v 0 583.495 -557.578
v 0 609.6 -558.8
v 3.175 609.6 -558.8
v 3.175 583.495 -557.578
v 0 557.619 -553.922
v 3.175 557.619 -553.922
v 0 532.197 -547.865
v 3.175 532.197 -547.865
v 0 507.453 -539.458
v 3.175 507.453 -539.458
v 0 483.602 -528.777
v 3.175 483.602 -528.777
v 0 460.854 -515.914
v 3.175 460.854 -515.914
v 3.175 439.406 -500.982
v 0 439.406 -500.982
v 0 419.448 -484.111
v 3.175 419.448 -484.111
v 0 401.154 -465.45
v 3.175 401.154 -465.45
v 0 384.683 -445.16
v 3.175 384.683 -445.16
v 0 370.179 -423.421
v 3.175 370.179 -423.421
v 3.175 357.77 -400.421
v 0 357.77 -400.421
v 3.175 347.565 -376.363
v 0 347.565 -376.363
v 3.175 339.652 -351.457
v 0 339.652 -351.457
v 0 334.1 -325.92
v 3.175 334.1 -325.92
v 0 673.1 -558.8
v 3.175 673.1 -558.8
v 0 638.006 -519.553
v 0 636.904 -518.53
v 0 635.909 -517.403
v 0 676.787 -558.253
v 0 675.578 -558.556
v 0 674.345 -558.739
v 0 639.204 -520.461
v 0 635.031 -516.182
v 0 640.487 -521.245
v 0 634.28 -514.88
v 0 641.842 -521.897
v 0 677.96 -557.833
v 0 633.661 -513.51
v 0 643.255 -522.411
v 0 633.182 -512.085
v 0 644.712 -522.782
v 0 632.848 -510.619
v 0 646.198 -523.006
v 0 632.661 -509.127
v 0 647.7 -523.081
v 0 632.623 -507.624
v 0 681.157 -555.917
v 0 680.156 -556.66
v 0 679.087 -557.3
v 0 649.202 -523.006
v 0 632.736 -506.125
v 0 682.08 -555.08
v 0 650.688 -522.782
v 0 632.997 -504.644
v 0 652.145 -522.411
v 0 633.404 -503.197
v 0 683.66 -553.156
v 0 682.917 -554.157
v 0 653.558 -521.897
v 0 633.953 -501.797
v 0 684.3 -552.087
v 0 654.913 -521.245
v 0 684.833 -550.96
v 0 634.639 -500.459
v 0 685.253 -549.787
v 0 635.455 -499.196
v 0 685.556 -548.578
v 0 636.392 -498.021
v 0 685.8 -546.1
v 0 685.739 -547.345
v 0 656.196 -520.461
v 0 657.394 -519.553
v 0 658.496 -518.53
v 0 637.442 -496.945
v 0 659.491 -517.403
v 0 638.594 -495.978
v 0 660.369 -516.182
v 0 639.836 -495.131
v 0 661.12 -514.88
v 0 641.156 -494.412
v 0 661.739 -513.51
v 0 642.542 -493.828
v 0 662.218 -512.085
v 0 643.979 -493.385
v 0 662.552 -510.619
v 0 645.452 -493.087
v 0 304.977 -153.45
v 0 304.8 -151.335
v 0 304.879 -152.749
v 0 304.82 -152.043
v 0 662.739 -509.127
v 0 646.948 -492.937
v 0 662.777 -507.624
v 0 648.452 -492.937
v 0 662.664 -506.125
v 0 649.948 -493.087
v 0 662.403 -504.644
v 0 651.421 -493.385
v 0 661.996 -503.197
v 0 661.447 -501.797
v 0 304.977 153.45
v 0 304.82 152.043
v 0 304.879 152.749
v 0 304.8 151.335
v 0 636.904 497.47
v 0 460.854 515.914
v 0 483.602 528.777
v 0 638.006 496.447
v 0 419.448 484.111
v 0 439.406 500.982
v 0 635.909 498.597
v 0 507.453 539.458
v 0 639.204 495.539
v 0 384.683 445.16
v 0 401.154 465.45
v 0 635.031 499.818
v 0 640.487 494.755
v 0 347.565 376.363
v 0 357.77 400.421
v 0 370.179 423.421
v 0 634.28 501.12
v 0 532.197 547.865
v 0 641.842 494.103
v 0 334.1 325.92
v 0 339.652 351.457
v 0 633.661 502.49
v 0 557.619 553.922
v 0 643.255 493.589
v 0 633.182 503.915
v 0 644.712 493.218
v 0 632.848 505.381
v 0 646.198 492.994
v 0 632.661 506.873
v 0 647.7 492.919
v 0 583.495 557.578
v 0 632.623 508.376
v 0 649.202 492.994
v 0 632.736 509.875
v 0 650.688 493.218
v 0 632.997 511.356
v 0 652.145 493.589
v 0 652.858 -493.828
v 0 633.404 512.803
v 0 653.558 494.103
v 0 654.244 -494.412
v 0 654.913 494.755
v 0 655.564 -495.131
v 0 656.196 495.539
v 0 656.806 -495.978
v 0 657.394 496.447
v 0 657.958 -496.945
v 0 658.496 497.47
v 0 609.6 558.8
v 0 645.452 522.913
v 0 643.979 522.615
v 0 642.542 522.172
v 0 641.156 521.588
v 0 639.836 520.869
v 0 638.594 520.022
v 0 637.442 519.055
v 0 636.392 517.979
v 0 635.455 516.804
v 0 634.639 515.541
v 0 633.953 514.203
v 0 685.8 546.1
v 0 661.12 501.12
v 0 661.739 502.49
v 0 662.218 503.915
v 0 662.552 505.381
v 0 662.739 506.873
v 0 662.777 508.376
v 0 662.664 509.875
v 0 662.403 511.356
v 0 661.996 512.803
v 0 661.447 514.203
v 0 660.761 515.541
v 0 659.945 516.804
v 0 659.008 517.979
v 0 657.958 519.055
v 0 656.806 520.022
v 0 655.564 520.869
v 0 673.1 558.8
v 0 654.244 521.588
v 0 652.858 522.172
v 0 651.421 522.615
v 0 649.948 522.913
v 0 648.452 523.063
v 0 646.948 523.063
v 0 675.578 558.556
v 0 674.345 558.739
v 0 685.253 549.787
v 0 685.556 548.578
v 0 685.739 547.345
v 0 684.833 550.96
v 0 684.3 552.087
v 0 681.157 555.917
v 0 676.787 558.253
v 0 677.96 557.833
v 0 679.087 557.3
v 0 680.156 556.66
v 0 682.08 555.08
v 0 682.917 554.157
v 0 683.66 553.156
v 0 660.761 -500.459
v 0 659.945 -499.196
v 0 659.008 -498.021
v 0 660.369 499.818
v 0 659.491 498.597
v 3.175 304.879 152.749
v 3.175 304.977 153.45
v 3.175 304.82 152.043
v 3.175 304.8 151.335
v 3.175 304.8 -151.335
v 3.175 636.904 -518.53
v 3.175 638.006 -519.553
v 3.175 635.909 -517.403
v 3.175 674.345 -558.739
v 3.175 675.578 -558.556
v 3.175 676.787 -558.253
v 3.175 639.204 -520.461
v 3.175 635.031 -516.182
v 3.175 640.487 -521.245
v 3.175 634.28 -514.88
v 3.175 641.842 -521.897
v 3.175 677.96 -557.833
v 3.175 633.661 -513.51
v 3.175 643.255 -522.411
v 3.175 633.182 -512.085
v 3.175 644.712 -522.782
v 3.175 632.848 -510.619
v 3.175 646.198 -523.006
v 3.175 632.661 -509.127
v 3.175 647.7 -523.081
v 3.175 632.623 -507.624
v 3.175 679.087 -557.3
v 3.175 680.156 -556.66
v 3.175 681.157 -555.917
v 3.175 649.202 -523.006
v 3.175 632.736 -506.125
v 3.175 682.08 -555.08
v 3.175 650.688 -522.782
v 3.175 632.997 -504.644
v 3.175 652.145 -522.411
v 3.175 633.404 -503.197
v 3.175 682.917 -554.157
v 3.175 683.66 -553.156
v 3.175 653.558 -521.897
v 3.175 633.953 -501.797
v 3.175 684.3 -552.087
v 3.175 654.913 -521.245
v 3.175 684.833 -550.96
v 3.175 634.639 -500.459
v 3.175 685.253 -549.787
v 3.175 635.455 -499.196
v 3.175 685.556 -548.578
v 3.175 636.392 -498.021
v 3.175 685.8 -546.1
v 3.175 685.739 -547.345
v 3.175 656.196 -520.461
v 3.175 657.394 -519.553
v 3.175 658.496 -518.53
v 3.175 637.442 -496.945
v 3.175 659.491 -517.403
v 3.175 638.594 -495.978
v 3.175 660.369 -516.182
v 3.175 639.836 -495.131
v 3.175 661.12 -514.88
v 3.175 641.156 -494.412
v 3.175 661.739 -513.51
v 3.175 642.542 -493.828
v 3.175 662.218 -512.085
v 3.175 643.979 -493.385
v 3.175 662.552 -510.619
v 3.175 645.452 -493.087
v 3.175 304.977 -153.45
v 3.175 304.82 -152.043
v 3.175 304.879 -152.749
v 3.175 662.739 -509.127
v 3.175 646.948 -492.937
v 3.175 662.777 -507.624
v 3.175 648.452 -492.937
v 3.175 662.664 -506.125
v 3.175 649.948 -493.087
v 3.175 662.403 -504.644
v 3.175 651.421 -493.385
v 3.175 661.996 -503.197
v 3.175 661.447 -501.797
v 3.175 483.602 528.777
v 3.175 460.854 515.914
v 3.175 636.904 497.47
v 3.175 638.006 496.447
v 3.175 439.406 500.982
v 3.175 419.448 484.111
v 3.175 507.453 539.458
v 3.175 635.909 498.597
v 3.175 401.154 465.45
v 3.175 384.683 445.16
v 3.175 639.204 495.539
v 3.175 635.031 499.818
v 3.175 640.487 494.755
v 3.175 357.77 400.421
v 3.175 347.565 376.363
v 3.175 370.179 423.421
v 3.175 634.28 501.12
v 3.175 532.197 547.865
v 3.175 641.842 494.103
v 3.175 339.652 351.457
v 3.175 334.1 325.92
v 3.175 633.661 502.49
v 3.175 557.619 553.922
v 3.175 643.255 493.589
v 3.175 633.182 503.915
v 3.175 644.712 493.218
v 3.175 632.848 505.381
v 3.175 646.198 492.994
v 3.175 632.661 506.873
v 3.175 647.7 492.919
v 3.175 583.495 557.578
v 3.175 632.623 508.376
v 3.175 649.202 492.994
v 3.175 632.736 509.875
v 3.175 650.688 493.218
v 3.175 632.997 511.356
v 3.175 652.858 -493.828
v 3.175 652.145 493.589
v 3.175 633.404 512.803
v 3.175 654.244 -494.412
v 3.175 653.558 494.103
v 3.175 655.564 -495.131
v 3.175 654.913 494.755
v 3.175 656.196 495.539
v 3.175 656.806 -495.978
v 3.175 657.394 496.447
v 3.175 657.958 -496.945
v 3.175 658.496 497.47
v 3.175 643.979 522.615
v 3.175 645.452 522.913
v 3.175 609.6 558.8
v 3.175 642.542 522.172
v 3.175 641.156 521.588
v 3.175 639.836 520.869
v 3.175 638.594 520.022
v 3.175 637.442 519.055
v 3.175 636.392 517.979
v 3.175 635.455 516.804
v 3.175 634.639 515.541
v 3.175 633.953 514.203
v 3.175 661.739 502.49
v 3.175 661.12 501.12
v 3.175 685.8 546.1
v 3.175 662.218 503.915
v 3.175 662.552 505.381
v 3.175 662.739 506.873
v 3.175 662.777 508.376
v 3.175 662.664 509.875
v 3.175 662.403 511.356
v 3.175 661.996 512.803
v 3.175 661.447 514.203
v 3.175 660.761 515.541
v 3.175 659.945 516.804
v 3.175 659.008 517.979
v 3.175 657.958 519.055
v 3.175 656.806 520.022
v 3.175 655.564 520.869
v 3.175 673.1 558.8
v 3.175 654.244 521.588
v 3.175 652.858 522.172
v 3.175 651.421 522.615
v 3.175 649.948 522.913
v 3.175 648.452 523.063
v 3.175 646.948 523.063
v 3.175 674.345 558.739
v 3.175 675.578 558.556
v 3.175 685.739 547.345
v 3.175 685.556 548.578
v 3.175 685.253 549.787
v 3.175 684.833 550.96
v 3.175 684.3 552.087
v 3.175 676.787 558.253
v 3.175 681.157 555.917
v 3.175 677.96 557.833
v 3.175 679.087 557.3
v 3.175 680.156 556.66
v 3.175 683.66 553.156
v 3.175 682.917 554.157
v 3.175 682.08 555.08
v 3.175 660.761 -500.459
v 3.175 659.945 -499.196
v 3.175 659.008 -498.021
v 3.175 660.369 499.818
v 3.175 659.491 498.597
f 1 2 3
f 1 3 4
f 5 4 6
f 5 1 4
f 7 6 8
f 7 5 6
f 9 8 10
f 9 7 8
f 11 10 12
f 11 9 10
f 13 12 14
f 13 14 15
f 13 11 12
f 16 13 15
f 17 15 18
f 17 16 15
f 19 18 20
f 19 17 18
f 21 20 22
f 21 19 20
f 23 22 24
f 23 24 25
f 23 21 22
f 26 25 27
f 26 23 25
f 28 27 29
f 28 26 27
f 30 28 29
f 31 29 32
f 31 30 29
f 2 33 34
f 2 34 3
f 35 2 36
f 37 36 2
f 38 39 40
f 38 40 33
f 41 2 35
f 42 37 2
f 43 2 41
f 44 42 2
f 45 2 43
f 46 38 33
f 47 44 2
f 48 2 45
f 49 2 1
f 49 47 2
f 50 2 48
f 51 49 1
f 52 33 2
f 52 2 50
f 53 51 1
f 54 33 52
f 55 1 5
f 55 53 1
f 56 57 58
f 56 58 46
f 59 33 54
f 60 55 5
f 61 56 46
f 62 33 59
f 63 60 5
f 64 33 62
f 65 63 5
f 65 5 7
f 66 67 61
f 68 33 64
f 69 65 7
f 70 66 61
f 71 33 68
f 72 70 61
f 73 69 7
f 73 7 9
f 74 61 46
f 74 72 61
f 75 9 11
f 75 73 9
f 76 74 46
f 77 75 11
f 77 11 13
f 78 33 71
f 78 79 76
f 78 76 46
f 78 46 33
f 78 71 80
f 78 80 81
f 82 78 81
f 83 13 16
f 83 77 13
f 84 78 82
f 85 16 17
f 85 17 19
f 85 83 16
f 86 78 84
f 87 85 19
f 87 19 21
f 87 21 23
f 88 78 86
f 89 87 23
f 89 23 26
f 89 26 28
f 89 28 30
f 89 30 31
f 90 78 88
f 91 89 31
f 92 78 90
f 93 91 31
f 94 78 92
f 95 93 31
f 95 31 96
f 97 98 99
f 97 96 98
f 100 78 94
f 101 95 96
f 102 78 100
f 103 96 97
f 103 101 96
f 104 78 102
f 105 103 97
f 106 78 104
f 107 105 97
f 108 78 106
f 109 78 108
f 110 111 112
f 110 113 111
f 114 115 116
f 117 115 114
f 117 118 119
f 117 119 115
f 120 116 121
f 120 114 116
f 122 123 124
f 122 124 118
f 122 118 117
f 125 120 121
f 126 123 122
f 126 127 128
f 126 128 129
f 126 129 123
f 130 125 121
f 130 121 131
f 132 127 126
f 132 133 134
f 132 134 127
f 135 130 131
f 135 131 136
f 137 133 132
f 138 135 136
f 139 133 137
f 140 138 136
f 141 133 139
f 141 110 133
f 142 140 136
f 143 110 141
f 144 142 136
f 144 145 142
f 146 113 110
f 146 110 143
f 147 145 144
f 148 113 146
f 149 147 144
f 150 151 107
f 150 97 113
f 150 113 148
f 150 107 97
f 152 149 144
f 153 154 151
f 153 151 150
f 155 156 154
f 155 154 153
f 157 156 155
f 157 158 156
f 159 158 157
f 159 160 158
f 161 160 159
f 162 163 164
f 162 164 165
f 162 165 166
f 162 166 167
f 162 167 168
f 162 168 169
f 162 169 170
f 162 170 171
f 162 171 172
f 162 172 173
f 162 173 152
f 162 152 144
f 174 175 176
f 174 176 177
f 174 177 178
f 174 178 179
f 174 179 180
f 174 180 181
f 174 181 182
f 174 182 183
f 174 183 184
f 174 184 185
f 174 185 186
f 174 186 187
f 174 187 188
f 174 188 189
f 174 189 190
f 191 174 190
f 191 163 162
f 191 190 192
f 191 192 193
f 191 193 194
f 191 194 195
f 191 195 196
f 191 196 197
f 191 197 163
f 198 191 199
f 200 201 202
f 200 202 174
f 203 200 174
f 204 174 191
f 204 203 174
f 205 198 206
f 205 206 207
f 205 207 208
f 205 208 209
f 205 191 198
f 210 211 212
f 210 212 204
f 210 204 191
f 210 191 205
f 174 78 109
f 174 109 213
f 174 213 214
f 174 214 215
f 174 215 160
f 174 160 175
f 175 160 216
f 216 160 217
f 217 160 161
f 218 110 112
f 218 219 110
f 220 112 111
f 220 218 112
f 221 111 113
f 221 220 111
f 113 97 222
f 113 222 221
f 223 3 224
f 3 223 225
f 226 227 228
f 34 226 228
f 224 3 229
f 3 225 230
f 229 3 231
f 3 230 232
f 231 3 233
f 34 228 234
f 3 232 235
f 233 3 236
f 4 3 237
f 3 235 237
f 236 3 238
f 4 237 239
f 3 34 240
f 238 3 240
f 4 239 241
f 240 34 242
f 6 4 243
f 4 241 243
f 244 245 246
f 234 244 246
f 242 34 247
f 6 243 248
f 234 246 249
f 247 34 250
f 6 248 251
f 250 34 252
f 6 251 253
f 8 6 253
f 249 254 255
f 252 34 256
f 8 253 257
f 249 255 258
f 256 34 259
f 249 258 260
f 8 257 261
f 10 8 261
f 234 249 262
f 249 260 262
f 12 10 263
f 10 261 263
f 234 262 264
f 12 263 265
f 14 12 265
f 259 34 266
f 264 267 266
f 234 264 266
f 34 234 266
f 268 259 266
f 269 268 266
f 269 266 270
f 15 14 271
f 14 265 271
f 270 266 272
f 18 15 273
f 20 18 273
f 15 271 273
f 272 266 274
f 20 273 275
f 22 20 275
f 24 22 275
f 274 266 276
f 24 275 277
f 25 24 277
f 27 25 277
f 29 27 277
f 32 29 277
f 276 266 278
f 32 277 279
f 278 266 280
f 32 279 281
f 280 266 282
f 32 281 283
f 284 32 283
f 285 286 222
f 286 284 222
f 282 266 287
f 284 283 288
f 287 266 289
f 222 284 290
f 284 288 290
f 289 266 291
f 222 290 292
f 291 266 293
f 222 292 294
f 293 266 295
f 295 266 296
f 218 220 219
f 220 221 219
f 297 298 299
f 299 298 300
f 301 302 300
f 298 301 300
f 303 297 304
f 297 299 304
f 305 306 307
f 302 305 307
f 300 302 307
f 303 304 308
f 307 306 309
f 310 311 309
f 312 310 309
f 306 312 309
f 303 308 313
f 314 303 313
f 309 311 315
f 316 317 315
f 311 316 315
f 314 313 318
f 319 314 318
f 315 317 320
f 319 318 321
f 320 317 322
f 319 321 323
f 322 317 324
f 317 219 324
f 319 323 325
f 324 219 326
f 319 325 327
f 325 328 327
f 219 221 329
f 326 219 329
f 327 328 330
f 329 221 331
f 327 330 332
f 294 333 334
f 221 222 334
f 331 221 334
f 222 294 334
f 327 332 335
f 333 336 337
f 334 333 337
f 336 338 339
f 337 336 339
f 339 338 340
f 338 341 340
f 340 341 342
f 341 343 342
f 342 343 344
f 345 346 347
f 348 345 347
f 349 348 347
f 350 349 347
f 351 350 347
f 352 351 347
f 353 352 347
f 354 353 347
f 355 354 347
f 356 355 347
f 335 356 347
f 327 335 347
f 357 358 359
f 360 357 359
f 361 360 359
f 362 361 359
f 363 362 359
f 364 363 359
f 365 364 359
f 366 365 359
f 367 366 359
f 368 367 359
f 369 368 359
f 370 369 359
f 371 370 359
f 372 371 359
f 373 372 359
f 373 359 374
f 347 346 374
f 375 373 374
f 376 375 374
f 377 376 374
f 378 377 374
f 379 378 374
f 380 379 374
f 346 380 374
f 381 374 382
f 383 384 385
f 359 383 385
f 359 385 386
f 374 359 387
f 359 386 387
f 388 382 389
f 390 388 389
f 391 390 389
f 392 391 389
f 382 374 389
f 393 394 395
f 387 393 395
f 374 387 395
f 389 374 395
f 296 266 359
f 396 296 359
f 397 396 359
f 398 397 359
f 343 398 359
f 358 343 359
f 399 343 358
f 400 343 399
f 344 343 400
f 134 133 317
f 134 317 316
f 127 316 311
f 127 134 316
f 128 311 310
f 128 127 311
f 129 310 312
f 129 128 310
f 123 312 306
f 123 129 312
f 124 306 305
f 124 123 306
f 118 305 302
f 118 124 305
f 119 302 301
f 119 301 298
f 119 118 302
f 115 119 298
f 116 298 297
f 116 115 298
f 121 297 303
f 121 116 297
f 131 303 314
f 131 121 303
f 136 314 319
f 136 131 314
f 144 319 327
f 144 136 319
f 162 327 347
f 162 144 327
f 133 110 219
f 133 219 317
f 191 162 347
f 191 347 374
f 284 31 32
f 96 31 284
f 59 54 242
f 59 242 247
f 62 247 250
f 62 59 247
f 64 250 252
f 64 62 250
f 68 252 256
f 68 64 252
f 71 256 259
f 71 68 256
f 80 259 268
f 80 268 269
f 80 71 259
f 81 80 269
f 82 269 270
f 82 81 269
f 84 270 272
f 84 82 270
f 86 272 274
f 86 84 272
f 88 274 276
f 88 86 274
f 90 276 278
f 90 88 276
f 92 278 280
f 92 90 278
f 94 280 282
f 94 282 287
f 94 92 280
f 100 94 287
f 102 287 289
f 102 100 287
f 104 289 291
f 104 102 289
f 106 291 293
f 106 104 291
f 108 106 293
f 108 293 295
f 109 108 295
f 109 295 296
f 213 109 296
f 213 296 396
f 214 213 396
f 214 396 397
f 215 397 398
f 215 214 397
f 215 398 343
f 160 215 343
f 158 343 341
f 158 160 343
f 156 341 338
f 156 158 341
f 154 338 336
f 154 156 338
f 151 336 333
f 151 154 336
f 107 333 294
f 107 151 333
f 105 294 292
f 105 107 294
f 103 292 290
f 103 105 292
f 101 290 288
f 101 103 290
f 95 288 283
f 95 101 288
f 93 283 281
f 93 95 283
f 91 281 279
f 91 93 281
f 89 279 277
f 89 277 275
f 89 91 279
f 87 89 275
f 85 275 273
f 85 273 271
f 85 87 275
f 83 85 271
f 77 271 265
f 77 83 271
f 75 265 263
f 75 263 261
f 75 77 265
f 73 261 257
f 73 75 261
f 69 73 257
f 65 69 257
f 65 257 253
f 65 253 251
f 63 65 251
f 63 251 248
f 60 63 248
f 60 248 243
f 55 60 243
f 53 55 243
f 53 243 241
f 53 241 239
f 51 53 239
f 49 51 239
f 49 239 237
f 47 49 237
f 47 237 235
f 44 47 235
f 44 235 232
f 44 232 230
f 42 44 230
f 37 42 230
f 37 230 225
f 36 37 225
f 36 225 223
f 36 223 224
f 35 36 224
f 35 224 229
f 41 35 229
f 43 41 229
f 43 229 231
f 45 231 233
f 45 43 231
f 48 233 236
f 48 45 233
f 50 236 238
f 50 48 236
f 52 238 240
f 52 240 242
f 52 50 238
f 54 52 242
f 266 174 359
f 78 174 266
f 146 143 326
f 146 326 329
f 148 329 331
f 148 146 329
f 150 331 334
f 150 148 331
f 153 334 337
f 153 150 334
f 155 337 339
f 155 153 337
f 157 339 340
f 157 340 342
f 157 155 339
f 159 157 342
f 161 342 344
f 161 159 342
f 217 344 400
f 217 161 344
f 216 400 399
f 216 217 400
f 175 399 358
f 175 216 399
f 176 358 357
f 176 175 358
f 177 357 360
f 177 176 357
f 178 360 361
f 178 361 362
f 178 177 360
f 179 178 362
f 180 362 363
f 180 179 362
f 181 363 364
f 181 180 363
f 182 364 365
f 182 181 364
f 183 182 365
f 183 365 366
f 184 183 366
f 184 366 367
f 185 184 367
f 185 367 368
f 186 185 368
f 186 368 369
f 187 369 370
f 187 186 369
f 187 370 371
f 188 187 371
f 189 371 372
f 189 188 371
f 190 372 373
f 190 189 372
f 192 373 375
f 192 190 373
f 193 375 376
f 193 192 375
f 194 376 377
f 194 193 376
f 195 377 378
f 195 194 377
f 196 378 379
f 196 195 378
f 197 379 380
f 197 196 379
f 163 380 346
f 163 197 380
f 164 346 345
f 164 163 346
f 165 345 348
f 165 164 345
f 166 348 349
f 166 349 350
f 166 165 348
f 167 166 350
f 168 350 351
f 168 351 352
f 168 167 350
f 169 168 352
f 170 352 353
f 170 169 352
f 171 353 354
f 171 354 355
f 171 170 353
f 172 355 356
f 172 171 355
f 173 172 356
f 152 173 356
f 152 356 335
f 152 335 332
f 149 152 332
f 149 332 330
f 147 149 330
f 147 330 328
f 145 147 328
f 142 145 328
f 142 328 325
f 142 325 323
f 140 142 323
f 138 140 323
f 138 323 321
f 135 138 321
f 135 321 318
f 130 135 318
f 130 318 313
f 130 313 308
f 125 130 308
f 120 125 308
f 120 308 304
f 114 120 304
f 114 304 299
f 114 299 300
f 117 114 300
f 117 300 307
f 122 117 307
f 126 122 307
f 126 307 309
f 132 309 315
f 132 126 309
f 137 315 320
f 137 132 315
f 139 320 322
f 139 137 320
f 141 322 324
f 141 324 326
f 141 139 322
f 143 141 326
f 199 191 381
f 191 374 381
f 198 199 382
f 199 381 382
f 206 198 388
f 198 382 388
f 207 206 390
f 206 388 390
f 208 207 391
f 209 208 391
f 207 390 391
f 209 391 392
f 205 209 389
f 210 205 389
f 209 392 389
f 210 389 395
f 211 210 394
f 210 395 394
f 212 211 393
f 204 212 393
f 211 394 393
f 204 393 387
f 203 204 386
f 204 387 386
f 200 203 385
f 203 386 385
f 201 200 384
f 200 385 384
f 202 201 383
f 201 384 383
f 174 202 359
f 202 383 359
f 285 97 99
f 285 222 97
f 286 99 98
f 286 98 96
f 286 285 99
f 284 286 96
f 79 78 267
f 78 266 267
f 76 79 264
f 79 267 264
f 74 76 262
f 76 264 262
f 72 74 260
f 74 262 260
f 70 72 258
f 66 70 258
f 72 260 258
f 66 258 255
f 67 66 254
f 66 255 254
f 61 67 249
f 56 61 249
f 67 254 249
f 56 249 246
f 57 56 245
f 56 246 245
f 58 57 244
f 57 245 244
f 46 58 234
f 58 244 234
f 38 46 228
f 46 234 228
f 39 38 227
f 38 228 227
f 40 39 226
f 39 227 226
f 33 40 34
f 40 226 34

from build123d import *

# Parameters (mm, degrees)
SKETCH1_R           = 15.08125
BOSS_EXTRUDE1_DEPTH = 3.175
FILLET1_R           = 12.7


with BuildPart() as part:
    # Sketch1 → Boss-Extrude1 (new body)
    with BuildSketch(Plane(origin=(0, 0, 0), x_dir=(0, 0, -1), z_dir=(1, 0, 0))):
        with BuildLine():
            Line((-558.8, 609.6), (-558.8, 685.8))
            Line((-558.8, 685.8), (558.8, 685.8))
            Line((558.8, 685.8), (558.8, 609.6))
            ThreePointArc((558.8, 609.6), (492.779998657, 429.230002015), (325.91999876, 334.100000517))
            Line((325.91999876, 334.100000517), (152.4, 304.8))
            Line((152.4, 304.8), (-152.4, 304.8))
            Line((-152.4, 304.8), (-325.91999876, 334.100000517))
            ThreePointArc((-325.91999876, 334.100000517), (-492.779998657, 429.230002015), (-558.8, 609.6))
        make_face()
        with Locations((-508, 647.7)):
            Circle(SKETCH1_R, mode=Mode.SUBTRACT)
        with Locations((508, 647.7)):
            Circle(SKETCH1_R, mode=Mode.SUBTRACT)
    extrude(amount=BOSS_EXTRUDE1_DEPTH)

    # Fillet1
    fillet1_edges = [part.edges().sort_by_distance(p)[0] for p in [
        (1.5875, 304.8, -152.4),
        (1.5875, 304.8, 152.4),
        (1.5875, 685.8, 558.8),
        (1.5875, 685.8, -558.8),
    ]]
    fillet(fillet1_edges, radius=FILLET1_R)


solid = part.part
